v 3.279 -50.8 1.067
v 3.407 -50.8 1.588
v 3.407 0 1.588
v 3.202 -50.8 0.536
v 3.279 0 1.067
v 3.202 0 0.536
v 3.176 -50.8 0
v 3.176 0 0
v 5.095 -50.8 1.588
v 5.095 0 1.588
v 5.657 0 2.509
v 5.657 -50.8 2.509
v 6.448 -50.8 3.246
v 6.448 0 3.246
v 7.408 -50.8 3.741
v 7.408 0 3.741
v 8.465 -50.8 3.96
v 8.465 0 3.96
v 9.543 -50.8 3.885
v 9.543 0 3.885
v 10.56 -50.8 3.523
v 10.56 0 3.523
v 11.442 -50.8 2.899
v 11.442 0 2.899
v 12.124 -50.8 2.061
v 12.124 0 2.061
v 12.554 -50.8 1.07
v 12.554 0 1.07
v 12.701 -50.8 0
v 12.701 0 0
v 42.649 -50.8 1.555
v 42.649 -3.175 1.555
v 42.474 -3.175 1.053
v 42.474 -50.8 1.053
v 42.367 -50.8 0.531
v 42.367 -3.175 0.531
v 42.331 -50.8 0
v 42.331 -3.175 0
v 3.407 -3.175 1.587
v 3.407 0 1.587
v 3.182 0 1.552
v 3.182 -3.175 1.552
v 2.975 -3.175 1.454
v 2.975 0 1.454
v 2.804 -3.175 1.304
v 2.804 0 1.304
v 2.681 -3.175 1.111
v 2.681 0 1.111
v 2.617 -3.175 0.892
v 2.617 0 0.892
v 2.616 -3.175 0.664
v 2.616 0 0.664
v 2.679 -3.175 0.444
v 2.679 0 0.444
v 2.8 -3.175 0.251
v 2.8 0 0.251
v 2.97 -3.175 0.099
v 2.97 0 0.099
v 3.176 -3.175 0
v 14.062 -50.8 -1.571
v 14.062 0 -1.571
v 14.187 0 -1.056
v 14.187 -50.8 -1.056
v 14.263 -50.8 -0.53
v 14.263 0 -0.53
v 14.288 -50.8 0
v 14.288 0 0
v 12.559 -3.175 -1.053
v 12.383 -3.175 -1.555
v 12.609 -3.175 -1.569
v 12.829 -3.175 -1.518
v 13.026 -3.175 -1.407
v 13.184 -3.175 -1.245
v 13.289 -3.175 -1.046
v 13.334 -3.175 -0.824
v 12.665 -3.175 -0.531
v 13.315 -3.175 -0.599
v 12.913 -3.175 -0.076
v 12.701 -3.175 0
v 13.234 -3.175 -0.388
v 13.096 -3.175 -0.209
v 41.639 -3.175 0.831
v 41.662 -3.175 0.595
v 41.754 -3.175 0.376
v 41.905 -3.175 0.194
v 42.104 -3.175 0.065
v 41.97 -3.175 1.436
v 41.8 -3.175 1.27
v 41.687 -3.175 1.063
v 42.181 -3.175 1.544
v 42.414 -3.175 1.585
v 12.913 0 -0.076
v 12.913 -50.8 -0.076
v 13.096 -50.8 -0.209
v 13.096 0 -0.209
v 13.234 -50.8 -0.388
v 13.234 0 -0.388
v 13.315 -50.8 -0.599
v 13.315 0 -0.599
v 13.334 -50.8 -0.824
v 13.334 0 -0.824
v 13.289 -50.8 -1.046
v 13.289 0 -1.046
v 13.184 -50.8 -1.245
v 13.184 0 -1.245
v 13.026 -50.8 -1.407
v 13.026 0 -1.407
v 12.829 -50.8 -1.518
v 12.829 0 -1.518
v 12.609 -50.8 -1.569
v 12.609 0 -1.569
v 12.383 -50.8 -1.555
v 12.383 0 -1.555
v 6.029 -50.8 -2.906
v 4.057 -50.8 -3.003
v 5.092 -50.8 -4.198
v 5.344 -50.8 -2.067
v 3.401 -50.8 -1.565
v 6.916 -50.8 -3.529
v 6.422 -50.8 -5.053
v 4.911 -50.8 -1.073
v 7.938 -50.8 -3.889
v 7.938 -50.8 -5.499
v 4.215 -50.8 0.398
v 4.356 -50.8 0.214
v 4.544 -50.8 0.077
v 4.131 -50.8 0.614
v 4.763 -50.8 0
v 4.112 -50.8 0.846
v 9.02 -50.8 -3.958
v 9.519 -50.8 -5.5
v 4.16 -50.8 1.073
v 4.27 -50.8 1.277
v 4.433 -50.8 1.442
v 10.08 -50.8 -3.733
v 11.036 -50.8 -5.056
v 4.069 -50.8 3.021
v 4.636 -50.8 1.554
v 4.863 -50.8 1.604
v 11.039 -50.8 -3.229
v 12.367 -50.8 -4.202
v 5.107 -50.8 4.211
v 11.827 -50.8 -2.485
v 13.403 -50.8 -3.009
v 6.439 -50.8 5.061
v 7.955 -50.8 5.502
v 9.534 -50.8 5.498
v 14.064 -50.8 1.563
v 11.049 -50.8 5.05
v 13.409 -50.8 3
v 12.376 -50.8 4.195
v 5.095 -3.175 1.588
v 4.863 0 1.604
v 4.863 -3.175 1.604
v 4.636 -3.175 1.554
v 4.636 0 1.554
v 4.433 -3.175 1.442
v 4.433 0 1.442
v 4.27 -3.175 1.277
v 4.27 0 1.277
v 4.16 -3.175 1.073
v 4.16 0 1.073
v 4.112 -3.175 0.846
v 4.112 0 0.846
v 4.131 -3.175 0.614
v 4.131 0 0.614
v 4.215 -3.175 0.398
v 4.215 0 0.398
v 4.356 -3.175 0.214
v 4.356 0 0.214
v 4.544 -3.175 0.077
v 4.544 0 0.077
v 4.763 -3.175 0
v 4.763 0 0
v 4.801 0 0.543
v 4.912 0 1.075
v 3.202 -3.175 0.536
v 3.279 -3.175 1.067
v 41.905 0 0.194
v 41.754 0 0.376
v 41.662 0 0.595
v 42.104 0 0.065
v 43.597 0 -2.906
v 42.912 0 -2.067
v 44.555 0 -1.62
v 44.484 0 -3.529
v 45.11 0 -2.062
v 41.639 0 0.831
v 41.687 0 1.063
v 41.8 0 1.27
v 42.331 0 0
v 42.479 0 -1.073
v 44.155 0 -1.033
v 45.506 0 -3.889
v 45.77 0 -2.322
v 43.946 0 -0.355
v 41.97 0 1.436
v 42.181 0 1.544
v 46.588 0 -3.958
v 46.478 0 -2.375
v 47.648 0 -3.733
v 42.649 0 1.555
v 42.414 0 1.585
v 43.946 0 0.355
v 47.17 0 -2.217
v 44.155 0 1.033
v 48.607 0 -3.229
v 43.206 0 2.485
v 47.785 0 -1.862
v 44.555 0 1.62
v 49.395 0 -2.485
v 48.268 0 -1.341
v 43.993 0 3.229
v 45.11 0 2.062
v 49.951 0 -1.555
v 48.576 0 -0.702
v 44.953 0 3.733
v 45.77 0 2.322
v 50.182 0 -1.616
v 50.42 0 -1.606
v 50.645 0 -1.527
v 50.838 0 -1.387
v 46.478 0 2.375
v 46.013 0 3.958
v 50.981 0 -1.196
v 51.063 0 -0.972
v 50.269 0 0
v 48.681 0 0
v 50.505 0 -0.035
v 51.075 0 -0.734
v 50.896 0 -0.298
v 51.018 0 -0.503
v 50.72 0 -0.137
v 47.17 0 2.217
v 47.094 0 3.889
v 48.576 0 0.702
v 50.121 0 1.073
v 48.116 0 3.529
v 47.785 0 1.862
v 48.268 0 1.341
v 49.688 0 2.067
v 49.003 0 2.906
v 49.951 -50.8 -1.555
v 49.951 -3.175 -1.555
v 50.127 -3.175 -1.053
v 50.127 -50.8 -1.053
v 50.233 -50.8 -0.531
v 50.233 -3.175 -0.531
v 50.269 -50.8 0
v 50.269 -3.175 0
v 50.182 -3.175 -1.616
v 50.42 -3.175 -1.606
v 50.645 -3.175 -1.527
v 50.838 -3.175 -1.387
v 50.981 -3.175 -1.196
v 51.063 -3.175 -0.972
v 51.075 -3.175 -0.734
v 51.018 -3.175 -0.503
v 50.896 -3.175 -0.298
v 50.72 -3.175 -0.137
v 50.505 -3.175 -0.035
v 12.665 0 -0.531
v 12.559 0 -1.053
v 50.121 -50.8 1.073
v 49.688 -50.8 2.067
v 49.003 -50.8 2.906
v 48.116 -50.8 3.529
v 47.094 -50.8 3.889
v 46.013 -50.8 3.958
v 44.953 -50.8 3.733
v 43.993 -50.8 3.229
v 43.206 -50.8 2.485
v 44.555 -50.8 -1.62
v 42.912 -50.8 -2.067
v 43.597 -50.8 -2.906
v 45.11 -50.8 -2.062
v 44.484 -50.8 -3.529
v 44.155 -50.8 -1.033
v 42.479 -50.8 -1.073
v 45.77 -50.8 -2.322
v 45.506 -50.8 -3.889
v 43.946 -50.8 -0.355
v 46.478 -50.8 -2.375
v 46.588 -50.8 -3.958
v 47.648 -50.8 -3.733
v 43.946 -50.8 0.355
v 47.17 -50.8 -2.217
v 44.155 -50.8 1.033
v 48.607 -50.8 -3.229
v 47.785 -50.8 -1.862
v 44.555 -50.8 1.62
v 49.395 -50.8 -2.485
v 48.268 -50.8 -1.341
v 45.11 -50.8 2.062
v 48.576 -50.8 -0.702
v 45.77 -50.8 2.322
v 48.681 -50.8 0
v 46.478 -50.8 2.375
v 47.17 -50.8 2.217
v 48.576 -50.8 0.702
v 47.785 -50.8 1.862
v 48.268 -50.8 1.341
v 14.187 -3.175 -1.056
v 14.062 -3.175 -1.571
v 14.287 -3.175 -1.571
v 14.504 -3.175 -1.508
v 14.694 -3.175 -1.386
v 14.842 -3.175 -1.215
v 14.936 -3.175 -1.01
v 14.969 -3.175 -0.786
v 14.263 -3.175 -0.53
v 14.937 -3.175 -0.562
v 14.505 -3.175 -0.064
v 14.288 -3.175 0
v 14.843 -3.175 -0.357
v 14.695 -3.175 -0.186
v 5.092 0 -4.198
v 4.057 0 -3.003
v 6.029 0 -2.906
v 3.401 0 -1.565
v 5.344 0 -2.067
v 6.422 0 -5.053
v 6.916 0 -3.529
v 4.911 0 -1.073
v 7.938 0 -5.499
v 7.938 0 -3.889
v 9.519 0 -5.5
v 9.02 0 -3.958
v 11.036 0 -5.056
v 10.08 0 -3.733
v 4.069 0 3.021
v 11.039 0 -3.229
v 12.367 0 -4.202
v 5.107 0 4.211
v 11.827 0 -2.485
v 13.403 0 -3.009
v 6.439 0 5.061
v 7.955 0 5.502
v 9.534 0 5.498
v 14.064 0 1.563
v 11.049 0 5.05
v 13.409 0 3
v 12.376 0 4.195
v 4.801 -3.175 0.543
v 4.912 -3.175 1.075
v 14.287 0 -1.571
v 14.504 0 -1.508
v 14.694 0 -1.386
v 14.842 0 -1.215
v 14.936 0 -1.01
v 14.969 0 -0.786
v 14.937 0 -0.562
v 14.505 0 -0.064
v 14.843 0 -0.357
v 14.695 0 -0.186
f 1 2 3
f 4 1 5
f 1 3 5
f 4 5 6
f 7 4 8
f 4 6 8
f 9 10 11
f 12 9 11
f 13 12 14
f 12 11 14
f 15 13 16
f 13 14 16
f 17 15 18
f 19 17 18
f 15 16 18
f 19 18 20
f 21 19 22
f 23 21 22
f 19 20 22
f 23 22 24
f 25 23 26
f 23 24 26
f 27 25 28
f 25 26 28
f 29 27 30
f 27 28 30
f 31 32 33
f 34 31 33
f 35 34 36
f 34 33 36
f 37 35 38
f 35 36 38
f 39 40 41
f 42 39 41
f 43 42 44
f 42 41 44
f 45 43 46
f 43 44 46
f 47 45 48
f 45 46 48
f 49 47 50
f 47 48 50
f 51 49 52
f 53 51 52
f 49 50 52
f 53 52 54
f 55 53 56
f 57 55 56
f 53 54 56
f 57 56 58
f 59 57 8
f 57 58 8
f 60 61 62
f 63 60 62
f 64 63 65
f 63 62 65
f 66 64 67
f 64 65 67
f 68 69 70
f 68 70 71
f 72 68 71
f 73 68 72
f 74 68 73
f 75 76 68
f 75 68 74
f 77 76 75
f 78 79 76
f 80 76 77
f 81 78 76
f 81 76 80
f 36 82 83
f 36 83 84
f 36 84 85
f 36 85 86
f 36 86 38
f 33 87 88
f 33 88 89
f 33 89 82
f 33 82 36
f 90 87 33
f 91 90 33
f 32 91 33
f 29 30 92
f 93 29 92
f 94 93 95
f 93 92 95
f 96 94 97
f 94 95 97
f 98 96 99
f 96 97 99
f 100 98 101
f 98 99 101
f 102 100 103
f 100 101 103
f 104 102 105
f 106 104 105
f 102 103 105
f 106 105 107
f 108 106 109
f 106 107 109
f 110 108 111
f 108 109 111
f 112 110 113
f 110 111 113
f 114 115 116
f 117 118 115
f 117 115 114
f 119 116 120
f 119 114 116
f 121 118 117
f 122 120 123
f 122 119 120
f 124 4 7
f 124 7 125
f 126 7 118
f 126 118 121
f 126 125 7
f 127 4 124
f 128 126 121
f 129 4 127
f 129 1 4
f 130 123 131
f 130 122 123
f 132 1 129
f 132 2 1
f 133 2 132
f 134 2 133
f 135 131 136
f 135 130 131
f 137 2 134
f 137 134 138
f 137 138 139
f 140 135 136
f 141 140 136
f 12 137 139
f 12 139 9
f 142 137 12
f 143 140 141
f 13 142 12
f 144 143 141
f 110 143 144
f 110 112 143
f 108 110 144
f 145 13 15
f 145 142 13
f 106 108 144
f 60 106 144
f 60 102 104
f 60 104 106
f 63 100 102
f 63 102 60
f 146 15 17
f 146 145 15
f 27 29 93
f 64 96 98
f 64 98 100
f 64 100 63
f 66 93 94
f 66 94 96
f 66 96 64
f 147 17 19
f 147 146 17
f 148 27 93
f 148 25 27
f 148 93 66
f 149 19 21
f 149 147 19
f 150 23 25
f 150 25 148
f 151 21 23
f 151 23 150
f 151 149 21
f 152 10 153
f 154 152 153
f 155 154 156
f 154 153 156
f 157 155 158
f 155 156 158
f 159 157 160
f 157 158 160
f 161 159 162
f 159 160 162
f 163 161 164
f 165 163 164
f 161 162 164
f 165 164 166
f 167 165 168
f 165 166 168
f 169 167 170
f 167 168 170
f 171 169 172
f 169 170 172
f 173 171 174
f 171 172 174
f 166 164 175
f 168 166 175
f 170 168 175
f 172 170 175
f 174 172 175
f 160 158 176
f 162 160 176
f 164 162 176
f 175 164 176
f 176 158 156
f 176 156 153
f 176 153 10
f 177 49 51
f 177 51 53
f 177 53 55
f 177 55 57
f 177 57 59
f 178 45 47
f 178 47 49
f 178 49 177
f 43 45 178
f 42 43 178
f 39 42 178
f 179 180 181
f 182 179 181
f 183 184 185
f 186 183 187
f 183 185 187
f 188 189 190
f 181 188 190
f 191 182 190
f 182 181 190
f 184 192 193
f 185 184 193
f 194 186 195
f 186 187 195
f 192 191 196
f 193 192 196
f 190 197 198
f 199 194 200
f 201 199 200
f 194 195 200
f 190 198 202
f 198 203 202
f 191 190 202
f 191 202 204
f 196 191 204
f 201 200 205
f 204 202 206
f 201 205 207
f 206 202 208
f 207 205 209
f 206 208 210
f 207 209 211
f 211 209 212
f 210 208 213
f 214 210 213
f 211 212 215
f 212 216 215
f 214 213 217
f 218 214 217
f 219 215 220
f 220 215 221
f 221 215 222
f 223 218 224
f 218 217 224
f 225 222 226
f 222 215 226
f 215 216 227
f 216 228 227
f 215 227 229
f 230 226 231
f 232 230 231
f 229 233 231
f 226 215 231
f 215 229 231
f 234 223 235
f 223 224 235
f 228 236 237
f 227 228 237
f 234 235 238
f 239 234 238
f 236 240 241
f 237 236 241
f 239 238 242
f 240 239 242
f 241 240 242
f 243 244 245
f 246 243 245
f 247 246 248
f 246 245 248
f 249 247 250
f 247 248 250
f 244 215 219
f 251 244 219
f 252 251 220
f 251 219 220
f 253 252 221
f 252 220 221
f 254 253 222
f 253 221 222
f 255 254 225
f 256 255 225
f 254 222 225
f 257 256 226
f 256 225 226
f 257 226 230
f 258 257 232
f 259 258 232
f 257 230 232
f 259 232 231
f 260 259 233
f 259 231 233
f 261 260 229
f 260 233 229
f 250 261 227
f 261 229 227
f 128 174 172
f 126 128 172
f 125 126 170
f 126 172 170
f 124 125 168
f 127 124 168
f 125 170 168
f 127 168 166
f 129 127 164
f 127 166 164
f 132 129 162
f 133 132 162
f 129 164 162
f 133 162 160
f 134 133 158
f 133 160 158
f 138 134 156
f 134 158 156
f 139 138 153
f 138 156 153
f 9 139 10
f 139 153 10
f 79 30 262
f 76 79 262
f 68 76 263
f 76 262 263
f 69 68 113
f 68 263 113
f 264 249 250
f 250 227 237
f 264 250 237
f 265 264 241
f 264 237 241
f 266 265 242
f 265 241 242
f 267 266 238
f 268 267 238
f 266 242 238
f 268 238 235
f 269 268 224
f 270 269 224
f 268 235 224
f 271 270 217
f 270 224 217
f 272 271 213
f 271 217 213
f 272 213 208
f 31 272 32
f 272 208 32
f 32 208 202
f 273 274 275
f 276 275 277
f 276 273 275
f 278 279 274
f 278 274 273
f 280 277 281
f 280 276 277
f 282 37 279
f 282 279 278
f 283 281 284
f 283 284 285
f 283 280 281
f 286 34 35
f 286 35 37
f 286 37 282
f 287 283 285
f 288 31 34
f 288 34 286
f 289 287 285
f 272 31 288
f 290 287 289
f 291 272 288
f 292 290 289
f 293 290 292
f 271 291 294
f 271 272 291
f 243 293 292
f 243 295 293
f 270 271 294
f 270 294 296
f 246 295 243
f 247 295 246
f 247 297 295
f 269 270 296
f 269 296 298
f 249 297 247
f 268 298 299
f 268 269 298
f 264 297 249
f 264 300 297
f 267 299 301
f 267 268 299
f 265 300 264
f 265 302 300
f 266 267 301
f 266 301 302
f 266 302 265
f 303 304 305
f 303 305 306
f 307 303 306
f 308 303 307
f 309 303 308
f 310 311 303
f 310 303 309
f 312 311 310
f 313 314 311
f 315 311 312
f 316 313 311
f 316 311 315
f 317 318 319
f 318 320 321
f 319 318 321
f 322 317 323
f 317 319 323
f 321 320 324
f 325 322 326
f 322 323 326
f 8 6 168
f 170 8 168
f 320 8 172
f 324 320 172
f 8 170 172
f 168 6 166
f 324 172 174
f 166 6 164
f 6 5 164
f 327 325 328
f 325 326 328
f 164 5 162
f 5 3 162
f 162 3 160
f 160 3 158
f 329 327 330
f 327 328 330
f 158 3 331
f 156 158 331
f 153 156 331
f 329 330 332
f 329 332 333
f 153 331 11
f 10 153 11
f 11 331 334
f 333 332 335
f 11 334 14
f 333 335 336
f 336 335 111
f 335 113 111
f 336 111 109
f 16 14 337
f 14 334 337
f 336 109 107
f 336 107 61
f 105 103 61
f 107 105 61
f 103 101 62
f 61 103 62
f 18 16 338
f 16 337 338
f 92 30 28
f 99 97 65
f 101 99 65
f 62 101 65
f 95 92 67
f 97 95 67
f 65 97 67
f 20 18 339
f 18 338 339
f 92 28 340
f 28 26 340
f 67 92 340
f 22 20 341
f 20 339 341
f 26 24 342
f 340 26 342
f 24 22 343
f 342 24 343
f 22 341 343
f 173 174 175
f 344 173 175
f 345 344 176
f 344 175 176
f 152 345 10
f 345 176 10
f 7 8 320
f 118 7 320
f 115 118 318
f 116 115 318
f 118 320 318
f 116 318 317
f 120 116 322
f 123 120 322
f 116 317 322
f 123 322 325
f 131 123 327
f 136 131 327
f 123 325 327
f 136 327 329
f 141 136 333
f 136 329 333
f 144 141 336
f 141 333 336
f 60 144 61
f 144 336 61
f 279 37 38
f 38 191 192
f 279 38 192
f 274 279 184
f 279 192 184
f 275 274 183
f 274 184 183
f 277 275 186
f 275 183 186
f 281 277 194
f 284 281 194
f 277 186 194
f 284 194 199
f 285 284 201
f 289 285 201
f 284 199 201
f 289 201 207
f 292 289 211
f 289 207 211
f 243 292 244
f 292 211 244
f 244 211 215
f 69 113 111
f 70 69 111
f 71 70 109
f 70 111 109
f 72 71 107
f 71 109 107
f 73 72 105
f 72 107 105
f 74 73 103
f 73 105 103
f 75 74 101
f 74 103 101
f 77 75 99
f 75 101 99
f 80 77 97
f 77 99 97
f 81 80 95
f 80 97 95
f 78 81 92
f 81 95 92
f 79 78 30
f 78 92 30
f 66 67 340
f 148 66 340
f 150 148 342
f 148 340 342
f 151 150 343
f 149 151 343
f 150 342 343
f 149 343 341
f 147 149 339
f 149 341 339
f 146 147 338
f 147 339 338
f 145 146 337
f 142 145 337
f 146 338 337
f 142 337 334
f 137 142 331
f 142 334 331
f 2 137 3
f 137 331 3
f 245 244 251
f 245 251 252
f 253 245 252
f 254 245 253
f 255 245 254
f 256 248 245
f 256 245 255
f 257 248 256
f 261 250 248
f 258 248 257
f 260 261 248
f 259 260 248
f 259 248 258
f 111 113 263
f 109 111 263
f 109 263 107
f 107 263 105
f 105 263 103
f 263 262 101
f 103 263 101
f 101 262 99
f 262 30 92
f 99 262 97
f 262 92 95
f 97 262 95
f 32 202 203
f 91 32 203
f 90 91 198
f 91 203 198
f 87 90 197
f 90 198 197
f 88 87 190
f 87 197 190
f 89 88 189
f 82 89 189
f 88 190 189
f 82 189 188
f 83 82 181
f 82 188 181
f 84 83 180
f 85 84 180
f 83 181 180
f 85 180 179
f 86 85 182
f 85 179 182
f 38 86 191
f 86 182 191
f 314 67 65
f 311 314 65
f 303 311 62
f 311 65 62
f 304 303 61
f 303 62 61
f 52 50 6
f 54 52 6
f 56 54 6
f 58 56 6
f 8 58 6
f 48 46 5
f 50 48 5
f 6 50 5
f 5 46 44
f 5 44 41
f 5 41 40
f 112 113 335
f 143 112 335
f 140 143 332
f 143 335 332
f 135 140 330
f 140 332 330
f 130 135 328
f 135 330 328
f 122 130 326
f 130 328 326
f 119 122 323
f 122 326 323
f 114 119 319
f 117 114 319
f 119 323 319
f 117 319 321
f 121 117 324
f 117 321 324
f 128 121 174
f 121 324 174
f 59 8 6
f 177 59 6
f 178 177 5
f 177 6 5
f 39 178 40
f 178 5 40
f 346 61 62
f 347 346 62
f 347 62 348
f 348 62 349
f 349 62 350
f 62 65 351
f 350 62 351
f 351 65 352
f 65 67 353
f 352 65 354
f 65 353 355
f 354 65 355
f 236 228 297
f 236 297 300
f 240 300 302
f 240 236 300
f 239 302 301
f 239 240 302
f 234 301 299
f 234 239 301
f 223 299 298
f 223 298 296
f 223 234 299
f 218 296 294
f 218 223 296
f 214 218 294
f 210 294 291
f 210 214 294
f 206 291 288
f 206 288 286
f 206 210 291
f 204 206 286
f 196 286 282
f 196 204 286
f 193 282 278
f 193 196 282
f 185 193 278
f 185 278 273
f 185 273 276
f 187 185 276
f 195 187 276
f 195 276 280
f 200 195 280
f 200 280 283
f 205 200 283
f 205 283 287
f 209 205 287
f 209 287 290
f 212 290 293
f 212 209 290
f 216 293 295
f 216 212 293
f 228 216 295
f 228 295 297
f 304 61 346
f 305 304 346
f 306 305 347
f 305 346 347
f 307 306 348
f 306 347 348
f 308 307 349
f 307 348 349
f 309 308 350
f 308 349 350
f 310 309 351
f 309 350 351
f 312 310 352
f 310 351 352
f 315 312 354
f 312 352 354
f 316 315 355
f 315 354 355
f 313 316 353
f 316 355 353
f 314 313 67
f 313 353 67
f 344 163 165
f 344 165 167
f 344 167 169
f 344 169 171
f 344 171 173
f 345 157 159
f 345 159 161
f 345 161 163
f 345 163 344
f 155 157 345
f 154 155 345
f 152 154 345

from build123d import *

# Parameters (mm, degrees)
F0_R     = 2.38125
F1_DEPTH = 50.8
F2_DEPTH = 3.175
F3_DEPTH = 3.175


# Not quite as in the source:
# - a feature names something its author has since deleted; it is built from what else it names


with BuildPart() as f1:
    # F0 (on Front) → F1 (new body)
    with BuildSketch(Plane.XZ):
        with BuildLine():
            ThreePointArc((49.9514526081, -1.5554259867), (50.1887675748, -0.79375), (50.2689526081, 0))
            ThreePointArc((50.2689526081, 0), (47.0939526081, 3.8885649667), (42.6489526081, 1.5554259867))
            ThreePointArc((42.6489526081, 1.5554259867), (42.4116376414, 0.79375), (42.3314526081, 0))
            ThreePointArc((42.3314526081, 0), (45.5064526081, -3.8885649667), (49.9514526081, -1.5554259867))
        make_face()
        with Locations((46.3002026081, 0)):
            Circle(F0_R, mode=Mode.SUBTRACT)
    extrude(amount=F1_DEPTH)

    # F0 (on Front) → F3 (join)
    with BuildSketch(Plane.XZ):
        with BuildLine():
            ThreePointArc((49.9514526081, -1.5554259867), (51.0627026081, -0.9721412417), (50.2689526081, 0))
            ThreePointArc((50.2689526081, 0), (50.1887675748, -0.79375), (49.9514526081, -1.5554259867))
        make_face()
        with BuildLine():
            ThreePointArc((42.3314526081, 0), (42.4116376414, 0.79375), (42.6489526081, 1.5554259867))
            ThreePointArc((42.6489526081, 1.5554259867), (41.654489723, 0.9483021717), (42.3314526081, 0))
        make_face()
    extrude(amount=F3_DEPTH)


with BuildPart() as f1b:
    # F0 (on Front) → F1, piece 2 (new body)
    with BuildSketch(Plane.XZ):
        with BuildLine():
            ThreePointArc((14.0615205309, -1.5712175183), (14.2313175592, -0.79375), (14.2883062452, 0))
            ThreePointArc((14.2883062452, 0), (9.534209736, 5.4980418187), (3.4074193738, 1.5875))
            ThreePointArc((3.4074193738, 1.5875), (3.2340144266, 0.8021534908), (3.1758062452, 0))
            ThreePointArc((3.1758062452, 0), (7.9383062452, -5.499261314), (14.0615205309, -1.5712175183))
        make_face()
        with BuildLine():
            ThreePointArc((5.0946367873, 1.5875), (9.5429101436, 3.8850344294), (12.7008062452, 0))
            ThreePointArc((12.7008062452, 0), (13.3197692385, -0.9364629933), (12.3833062452, -1.5554259867))
            ThreePointArc((12.3833062452, -1.5554259867), (7.9383062452, -3.8885649667), (4.7633062452, 0))
            ThreePointArc((4.7633062452, 0), (4.1277289023, 0.9609790707), (5.0946367873, 1.5875))
        make_face(mode=Mode.SUBTRACT)
    extrude(amount=F1_DEPTH)


with BuildPart() as f2:
    # F0 (on Front) → F2 (new body)
    with BuildSketch(Plane.XZ):
        with BuildLine():
            ThreePointArc((4.7633062452, 0), (4.8470218158, 0.8108538984), (5.0946367873, 1.5875))
            ThreePointArc((5.0946367873, 1.5875), (4.1277289023, 0.9609790707), (4.7633062452, 0))
        make_face()
    extrude(amount=F2_DEPTH)


with BuildPart() as f2b:
    # F0 (on Front) → F2, piece 2 (new body)
    with BuildSketch(Plane.XZ):
        with BuildLine():
            ThreePointArc((12.3833062452, -1.5554259867), (13.3197692385, -0.9364629933), (12.7008062452, 0))
            ThreePointArc((12.7008062452, 0), (12.6206212119, -0.79375), (12.3833062452, -1.5554259867))
        make_face()
    extrude(amount=F2_DEPTH)


with BuildPart() as f2c:
    # F0 (on Front) → F2, piece 3 (new body)
    with BuildSketch(Plane.XZ):
        with BuildLine():
            ThreePointArc((14.0615205309, -1.5712175183), (14.9605221472, -0.8990016163), (14.2883062452, 0))
            ThreePointArc((14.2883062452, 0), (14.2313175592, -0.79375), (14.0615205309, -1.5712175183))
        make_face()
    extrude(amount=F2_DEPTH)


with BuildPart() as f2d:
    # F0 (on Front) → F2, piece 4 (new body)
    with BuildSketch(Plane.XZ):
        with BuildLine():
            ThreePointArc((3.1758062452, 0), (3.2340144266, 0.8021534908), (3.4074193738, 1.5875))
            ThreePointArc((3.4074193738, 1.5875), (2.6170785878, 0.8921632166), (3.1758062452, 0))
        make_face()
    extrude(amount=F2_DEPTH)


solid = Compound([f1.part, f1b.part, f2.part, f2b.part, f2c.part, f2d.part])
